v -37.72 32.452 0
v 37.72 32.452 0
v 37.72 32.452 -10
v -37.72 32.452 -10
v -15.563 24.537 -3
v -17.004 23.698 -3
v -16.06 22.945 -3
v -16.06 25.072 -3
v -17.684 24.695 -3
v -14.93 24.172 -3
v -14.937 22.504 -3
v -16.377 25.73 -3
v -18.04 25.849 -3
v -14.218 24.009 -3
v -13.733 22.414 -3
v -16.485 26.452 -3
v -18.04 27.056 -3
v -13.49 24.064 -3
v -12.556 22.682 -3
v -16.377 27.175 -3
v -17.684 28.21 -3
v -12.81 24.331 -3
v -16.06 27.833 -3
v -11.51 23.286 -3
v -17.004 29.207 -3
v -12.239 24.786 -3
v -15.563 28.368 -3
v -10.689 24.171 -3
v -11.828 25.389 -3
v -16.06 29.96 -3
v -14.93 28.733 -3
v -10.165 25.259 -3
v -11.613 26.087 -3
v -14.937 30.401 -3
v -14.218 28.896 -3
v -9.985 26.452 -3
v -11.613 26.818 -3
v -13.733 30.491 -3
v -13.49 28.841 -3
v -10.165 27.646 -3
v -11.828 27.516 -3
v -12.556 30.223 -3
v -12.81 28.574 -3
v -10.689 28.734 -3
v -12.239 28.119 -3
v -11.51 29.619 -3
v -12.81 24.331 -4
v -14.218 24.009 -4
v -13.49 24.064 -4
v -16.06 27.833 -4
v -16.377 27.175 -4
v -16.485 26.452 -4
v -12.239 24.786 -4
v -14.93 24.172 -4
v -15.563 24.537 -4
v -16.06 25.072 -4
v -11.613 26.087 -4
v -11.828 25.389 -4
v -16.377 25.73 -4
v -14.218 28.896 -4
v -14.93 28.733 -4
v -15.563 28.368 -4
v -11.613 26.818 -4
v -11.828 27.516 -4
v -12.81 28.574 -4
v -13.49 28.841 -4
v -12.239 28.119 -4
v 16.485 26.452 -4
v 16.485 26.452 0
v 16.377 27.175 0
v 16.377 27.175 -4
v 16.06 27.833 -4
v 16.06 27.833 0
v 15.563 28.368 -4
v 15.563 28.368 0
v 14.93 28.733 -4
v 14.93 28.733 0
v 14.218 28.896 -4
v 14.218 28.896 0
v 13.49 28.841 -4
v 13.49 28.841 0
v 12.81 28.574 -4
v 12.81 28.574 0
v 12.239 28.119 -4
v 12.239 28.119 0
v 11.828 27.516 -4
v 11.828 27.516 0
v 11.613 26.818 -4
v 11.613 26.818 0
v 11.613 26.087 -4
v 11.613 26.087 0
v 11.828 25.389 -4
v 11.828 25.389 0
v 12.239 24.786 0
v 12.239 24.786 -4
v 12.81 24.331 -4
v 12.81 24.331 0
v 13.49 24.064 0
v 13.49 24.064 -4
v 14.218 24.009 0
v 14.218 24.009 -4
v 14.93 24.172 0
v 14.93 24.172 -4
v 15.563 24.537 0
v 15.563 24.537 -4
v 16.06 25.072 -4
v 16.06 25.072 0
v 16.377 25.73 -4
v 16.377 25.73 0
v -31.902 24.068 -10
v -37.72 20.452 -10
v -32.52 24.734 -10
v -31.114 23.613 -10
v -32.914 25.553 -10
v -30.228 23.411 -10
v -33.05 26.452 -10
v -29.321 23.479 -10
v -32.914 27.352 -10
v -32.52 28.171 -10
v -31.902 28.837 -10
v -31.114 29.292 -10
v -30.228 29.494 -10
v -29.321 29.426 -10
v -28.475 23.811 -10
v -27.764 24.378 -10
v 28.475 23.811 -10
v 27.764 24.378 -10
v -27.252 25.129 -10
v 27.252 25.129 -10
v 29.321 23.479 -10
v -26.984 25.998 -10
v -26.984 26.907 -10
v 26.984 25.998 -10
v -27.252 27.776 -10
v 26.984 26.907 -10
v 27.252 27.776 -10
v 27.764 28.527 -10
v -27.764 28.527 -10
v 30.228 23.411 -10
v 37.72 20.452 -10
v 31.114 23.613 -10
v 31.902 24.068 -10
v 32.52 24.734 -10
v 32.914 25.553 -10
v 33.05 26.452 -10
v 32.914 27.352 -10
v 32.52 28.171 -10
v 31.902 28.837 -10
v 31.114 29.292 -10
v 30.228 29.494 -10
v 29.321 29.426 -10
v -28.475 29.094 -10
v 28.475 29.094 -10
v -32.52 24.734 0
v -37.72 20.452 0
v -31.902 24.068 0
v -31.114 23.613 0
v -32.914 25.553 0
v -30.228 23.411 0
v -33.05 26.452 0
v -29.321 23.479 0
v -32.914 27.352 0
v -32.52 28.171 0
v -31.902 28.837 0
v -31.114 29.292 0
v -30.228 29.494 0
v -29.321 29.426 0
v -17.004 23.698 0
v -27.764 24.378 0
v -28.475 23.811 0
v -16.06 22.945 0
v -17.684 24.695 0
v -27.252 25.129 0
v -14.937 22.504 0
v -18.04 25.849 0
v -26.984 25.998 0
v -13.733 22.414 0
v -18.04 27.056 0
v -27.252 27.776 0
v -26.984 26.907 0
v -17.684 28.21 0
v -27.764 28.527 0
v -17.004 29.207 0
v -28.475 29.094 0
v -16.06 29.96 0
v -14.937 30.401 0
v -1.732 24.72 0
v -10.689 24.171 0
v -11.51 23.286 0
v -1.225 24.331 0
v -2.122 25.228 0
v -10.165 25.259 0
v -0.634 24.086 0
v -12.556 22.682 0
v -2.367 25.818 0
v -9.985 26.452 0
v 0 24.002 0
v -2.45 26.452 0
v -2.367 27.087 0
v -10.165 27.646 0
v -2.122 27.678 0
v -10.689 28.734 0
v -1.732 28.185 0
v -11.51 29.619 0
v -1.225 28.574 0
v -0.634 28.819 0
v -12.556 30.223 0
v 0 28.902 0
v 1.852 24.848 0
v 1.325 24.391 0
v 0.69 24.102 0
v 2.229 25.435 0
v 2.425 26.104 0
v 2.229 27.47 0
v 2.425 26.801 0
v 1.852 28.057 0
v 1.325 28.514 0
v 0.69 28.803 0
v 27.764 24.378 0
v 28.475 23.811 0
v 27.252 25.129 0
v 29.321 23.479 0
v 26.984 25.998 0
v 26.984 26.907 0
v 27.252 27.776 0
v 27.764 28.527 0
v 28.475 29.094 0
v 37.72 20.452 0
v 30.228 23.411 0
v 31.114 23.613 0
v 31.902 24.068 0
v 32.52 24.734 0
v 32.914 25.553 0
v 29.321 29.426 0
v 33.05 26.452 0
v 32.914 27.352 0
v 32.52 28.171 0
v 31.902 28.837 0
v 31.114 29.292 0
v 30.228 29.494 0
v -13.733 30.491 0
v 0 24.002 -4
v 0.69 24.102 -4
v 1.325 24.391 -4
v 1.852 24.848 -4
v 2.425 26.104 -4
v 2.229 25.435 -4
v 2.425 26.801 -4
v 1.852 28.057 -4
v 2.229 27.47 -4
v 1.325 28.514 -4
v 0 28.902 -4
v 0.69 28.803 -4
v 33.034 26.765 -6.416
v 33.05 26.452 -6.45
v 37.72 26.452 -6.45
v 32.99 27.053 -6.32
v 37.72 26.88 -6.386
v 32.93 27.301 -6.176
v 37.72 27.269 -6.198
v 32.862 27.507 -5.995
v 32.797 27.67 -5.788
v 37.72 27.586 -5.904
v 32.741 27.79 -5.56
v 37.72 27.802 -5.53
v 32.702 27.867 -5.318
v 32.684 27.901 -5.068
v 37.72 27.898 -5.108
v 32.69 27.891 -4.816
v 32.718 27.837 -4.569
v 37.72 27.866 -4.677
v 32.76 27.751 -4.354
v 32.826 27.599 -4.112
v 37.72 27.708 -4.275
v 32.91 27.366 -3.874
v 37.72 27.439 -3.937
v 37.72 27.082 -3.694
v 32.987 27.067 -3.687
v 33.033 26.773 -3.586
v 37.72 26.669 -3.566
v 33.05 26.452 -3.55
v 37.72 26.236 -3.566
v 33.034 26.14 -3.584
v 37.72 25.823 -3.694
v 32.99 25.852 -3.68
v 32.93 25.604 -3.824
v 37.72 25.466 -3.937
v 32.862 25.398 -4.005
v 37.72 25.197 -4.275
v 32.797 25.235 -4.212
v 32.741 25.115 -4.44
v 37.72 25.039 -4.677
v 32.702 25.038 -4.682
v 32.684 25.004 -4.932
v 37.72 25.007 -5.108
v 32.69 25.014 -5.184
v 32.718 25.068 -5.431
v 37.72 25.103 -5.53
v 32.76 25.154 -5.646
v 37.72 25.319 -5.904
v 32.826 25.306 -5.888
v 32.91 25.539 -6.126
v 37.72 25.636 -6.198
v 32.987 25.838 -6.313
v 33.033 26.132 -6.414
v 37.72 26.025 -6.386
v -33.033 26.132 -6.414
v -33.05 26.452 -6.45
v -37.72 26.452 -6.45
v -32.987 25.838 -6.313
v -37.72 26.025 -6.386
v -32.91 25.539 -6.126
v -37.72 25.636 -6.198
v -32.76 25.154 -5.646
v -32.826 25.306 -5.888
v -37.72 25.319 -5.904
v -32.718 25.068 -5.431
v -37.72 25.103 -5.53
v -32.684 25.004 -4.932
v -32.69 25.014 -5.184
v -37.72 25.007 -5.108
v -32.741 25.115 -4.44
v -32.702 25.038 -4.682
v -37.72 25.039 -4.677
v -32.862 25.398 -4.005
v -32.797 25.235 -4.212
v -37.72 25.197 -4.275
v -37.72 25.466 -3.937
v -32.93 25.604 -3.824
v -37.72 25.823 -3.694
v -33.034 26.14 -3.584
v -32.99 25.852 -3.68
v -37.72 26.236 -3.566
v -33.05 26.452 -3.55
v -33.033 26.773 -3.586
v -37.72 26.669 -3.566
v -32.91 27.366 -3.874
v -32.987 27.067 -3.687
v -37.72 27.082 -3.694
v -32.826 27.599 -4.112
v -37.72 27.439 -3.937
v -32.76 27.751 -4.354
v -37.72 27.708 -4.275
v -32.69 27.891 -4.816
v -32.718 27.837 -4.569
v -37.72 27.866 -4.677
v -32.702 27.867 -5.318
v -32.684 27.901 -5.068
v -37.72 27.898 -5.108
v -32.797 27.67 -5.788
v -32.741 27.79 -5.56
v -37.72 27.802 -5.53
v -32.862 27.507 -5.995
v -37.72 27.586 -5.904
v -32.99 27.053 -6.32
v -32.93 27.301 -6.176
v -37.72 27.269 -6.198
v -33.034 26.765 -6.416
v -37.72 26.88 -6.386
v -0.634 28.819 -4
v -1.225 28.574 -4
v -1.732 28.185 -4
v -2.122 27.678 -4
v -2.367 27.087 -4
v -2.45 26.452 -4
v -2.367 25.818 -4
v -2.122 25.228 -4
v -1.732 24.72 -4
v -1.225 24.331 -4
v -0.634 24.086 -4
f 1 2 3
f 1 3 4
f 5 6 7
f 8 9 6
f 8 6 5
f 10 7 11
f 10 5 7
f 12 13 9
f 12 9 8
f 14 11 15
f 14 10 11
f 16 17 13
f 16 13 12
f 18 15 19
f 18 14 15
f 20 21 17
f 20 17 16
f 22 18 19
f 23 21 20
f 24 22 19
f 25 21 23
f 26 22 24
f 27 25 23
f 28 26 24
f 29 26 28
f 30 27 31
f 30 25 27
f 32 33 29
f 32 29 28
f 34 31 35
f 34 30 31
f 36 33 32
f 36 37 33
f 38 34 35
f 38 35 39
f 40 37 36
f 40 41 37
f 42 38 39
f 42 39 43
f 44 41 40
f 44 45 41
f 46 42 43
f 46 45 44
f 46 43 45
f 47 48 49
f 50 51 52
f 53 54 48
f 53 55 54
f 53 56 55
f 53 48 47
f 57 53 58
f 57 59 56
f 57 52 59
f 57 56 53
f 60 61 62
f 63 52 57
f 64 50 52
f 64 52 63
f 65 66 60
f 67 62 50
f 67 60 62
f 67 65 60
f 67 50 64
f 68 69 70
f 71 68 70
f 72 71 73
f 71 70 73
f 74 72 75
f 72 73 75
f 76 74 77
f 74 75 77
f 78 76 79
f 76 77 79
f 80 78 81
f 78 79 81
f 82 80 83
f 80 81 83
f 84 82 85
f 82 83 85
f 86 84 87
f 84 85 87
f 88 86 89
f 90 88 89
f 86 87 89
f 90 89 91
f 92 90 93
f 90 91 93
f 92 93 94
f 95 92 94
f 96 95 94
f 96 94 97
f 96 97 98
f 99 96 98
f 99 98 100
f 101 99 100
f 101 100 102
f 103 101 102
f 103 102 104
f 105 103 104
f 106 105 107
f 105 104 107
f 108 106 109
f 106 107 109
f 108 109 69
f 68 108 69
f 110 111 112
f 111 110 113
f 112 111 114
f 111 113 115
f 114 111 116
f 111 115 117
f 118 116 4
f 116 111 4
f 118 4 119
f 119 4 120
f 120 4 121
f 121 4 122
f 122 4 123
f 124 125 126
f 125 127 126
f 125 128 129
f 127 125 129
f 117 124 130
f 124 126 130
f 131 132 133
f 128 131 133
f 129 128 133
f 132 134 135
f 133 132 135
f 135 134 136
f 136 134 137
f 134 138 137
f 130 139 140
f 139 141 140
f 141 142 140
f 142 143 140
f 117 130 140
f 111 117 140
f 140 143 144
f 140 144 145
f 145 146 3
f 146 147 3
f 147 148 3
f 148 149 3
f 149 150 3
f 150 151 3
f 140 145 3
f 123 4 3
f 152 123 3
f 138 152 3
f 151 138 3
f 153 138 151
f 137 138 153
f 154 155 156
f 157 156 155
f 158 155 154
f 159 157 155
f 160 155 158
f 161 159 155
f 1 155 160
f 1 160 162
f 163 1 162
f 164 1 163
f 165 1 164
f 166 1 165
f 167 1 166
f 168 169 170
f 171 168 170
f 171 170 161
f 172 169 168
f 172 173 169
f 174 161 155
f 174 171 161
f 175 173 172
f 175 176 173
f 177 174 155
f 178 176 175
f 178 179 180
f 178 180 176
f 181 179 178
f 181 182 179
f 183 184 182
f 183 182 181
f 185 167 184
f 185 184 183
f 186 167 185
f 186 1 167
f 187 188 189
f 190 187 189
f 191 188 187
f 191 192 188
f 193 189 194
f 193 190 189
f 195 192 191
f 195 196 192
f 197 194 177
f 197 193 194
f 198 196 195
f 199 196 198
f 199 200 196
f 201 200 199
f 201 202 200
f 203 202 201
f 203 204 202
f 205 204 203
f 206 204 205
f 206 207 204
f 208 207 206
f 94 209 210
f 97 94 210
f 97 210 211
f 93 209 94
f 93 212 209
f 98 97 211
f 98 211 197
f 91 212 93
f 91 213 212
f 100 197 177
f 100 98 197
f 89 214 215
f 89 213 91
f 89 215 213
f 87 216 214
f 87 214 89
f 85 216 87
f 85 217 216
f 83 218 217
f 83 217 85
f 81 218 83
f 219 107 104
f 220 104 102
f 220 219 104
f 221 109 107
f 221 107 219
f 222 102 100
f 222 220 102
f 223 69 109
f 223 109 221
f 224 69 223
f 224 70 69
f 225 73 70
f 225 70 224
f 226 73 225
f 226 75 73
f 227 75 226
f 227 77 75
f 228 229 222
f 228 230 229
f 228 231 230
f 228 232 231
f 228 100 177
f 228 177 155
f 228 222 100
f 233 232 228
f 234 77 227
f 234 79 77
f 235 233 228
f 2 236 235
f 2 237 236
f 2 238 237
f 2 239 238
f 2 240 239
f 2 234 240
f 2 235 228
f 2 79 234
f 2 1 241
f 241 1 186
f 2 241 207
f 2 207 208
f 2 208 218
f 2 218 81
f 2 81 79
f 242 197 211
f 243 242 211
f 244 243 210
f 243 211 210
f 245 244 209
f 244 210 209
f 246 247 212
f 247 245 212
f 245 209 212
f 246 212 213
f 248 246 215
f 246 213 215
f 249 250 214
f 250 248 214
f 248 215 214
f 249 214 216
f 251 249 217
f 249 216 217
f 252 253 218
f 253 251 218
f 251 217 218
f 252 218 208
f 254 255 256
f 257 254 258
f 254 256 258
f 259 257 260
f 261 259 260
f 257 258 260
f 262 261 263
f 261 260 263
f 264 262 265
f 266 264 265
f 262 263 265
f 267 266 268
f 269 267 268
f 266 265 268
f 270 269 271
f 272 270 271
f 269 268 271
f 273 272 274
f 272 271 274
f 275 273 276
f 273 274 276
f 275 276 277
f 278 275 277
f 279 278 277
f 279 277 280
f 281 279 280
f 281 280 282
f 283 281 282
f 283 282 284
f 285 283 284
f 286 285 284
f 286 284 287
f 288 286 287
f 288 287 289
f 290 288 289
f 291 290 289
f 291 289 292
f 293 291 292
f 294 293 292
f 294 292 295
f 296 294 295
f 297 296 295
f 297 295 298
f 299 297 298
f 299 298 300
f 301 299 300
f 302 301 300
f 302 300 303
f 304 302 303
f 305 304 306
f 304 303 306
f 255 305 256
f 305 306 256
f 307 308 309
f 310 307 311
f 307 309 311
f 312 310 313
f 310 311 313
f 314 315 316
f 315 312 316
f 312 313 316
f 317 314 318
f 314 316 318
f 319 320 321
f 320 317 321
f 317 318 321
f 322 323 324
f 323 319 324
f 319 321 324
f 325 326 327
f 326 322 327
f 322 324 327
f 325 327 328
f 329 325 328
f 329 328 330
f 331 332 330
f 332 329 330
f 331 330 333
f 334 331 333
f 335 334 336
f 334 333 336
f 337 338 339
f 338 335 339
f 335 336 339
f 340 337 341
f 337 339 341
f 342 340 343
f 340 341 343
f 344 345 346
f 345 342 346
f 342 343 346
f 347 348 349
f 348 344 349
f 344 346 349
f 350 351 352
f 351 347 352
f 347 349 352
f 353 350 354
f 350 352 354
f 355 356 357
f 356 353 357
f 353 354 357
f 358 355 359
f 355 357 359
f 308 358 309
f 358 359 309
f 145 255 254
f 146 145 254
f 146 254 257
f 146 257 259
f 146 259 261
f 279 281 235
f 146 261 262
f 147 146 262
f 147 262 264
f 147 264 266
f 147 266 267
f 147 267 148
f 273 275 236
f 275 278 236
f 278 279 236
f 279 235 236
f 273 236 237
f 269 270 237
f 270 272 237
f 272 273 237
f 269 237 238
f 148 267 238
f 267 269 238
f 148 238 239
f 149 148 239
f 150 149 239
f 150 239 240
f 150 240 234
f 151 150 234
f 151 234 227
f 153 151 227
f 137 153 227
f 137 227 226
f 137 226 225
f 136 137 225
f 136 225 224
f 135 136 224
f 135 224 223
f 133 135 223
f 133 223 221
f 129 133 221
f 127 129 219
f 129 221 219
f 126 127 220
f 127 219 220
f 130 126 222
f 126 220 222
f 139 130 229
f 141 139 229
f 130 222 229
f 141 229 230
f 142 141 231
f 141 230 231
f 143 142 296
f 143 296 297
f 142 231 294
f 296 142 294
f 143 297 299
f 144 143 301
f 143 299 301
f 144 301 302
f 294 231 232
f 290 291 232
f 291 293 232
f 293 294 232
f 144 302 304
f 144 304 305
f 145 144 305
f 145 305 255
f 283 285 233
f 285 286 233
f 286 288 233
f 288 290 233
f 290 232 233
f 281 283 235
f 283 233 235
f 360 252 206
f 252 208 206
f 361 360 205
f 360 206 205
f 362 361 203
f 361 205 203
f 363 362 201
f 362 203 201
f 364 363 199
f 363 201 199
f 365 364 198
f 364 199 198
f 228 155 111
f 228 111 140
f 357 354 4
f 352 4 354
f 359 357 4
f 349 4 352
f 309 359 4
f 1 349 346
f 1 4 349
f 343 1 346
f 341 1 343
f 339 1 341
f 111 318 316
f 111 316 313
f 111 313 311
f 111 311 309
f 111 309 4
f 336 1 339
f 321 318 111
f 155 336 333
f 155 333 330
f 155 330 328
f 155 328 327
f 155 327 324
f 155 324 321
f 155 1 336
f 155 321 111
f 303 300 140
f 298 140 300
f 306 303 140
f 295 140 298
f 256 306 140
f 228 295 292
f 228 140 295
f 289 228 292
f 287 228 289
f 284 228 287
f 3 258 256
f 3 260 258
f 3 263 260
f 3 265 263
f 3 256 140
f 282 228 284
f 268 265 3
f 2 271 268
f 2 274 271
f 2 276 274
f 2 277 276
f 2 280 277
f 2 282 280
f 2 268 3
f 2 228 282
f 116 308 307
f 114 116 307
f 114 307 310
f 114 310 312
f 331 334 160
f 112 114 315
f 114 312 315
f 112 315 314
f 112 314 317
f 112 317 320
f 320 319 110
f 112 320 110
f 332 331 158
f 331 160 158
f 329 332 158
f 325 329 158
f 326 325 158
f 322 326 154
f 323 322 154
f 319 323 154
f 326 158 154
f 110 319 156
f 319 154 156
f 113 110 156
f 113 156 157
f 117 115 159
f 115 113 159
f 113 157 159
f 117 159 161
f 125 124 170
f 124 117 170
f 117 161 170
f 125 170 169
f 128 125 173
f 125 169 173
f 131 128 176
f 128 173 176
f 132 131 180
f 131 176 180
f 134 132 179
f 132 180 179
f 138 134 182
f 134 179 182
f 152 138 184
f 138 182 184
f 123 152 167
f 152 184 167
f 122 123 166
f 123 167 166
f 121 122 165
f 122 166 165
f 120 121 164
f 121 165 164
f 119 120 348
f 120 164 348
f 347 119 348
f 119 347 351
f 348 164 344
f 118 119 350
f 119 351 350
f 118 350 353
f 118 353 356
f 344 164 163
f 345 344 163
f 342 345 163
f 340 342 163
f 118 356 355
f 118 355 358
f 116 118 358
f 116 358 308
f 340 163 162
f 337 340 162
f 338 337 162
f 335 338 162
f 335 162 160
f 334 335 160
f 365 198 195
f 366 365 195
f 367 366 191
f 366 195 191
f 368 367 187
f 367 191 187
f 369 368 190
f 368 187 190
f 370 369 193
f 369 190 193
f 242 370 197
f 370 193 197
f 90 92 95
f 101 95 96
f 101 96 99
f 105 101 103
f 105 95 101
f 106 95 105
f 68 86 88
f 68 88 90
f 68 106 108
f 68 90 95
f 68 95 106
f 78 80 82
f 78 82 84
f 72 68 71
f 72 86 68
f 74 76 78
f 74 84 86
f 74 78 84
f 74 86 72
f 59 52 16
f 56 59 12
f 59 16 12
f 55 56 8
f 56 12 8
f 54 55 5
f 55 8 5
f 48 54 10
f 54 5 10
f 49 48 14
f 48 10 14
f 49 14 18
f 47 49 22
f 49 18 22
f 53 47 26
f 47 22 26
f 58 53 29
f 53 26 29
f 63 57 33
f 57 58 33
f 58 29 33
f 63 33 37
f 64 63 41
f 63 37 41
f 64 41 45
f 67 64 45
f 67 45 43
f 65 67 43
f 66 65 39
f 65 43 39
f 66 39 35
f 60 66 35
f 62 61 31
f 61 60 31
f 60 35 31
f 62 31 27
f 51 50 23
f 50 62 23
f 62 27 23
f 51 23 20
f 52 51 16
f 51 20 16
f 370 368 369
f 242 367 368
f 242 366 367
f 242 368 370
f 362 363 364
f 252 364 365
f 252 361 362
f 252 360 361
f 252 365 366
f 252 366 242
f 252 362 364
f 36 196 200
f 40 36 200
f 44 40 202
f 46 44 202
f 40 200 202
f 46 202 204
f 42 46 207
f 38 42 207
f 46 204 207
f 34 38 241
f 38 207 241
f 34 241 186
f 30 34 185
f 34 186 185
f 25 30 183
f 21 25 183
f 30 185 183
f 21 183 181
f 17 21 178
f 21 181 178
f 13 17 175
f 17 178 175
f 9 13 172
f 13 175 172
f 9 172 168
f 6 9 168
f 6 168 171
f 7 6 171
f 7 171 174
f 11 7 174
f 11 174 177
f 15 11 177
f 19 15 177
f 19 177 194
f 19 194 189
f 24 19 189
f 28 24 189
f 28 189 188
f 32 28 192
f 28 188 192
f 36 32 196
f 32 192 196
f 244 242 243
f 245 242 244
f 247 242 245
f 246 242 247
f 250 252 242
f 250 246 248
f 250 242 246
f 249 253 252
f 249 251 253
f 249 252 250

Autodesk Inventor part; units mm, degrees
ref_plane "YZ Plane" through (0, 0, 0) normal (1, 0, 0) x (0, 1, 0)
ref_plane "XZ Plane" through (0, 0, 0) normal (0, 1, 0) x (-1, 0, 0)
ref_plane "XY Plane" through (0, 0, 0) normal (0, 0, 1) x (1, 0, 0)
sketch "Sketch1" plane through (0, 0, 0) normal (0, 0, 1) x (1, 0, 0)
  circle A0 centre (30, 26.4525) radius 3 projected
  circle A1 centre (-30, 26.4525) radius 3 projected
  line L0 (-12, 6.73) -> (12, 6.73) projected
  line L1 (12, 6.73) -> (12, 13) projected
  line L2 (12, 13) -> (-12, 13) projected
  line L3 (-12, 13) -> (-12, 6.73) projected
  line L4 (0, 33.0213) -> (0, 0)
  circle A2 centre (30, 26.4525) radius 3.05
  circle A3 centre (-30, 26.4525) radius 3.05
  line L5 (37.7199, 32.4525) -> (0, 32.4525)
  line L6 (0, 32.4525) -> (0, 20.4525)
  line L7 (0, 20.4525) -> (37.7199, 20.4525)
  line L8 (37.7199, 20.4525) -> (37.7199, 32.4525)
  circle A4 centre (30, 26.4525) radius 6 construction
  dimension "d0" = 6.1
  dimension "d1" = 6.1
  dimension "d12" = 3
extrude "Extrusion1" add sketch "Sketch1" against normal blind 10 contours L4 L5 L8 L7
sketch "Sketch2" plane through (0, 0, 0) normal (0, 0, 1) x (1, 0, 0)
  circle A0 centre (30, 26.4525) radius 3.05 projected
  line L0 (0, 20.4525) -> (0, 32.4525) projected
  circle A1 centre (0, 26.4525) radius 2.45
  circle A2 centre (14.0354, 26.4525) radius 2.45
  dimension "d13" = 4.9
  dimension "d14" = 4.9
extrude "Extrusion2" cut sketch "Sketch2" against normal blind 4 contours A1 L0 | L0 A1 | A2
sketch "Sketch3" plane through (37.7199, 20.4525, 0) normal (1, 0, 0) x (0, 0, -1)
  line L0 (0, 0) -> (0, 12) projected
  line L1 (0, 0) -> (10, 0) projected
  line L2 (10, 12) -> (10, 0) projected
  line L3 (0, 12) -> (10, 12) projected
  circle A0 centre (5, 6) radius 1.45
  point P0 (0, -20.4525)
  dimension "d15" = 2.9
extrude "Extrusion3" cut sketch "Sketch3" against normal up to surface contours A0
ref_plane "Work Plane1" through (37.7199, 32.4525, 0) normal (0.7071, 0.7071, 0) x (0, 0, 1)
mirror "Mirror2" about plane through (0, 20.4525, 0) normal (-1, 0, 0) of "Extrusion1", "Extrusion2", "Extrusion3"
sketch "Sketch5" plane through (0, 0, 0) normal (0, 0, 1) x (1, 0, 0)
  point P0 (0, 0)
sketch "Sketch6" plane through (0, 0, 0) normal (0, 0, 1) x (1, 0, 0)
  circle A0 centre (-14.0354, 26.4525) radius 2.45 projected
  circle A1 centre (-14.0354, 26.4525) radius 4.05
  point P0 (0, 0)
  dimension "d31" = 8.1
extrude "Extrusion5" cut sketch "Sketch6" against normal blind 3 contours A0 | A1
ref_plane "Work Plane2" through (-37.7199, 32.4525, 0) normal (0.7071, -0.7071, 0) x (0, 0, 1)
properties part number "cellSTORM_inverted_sampleholder_bar"
